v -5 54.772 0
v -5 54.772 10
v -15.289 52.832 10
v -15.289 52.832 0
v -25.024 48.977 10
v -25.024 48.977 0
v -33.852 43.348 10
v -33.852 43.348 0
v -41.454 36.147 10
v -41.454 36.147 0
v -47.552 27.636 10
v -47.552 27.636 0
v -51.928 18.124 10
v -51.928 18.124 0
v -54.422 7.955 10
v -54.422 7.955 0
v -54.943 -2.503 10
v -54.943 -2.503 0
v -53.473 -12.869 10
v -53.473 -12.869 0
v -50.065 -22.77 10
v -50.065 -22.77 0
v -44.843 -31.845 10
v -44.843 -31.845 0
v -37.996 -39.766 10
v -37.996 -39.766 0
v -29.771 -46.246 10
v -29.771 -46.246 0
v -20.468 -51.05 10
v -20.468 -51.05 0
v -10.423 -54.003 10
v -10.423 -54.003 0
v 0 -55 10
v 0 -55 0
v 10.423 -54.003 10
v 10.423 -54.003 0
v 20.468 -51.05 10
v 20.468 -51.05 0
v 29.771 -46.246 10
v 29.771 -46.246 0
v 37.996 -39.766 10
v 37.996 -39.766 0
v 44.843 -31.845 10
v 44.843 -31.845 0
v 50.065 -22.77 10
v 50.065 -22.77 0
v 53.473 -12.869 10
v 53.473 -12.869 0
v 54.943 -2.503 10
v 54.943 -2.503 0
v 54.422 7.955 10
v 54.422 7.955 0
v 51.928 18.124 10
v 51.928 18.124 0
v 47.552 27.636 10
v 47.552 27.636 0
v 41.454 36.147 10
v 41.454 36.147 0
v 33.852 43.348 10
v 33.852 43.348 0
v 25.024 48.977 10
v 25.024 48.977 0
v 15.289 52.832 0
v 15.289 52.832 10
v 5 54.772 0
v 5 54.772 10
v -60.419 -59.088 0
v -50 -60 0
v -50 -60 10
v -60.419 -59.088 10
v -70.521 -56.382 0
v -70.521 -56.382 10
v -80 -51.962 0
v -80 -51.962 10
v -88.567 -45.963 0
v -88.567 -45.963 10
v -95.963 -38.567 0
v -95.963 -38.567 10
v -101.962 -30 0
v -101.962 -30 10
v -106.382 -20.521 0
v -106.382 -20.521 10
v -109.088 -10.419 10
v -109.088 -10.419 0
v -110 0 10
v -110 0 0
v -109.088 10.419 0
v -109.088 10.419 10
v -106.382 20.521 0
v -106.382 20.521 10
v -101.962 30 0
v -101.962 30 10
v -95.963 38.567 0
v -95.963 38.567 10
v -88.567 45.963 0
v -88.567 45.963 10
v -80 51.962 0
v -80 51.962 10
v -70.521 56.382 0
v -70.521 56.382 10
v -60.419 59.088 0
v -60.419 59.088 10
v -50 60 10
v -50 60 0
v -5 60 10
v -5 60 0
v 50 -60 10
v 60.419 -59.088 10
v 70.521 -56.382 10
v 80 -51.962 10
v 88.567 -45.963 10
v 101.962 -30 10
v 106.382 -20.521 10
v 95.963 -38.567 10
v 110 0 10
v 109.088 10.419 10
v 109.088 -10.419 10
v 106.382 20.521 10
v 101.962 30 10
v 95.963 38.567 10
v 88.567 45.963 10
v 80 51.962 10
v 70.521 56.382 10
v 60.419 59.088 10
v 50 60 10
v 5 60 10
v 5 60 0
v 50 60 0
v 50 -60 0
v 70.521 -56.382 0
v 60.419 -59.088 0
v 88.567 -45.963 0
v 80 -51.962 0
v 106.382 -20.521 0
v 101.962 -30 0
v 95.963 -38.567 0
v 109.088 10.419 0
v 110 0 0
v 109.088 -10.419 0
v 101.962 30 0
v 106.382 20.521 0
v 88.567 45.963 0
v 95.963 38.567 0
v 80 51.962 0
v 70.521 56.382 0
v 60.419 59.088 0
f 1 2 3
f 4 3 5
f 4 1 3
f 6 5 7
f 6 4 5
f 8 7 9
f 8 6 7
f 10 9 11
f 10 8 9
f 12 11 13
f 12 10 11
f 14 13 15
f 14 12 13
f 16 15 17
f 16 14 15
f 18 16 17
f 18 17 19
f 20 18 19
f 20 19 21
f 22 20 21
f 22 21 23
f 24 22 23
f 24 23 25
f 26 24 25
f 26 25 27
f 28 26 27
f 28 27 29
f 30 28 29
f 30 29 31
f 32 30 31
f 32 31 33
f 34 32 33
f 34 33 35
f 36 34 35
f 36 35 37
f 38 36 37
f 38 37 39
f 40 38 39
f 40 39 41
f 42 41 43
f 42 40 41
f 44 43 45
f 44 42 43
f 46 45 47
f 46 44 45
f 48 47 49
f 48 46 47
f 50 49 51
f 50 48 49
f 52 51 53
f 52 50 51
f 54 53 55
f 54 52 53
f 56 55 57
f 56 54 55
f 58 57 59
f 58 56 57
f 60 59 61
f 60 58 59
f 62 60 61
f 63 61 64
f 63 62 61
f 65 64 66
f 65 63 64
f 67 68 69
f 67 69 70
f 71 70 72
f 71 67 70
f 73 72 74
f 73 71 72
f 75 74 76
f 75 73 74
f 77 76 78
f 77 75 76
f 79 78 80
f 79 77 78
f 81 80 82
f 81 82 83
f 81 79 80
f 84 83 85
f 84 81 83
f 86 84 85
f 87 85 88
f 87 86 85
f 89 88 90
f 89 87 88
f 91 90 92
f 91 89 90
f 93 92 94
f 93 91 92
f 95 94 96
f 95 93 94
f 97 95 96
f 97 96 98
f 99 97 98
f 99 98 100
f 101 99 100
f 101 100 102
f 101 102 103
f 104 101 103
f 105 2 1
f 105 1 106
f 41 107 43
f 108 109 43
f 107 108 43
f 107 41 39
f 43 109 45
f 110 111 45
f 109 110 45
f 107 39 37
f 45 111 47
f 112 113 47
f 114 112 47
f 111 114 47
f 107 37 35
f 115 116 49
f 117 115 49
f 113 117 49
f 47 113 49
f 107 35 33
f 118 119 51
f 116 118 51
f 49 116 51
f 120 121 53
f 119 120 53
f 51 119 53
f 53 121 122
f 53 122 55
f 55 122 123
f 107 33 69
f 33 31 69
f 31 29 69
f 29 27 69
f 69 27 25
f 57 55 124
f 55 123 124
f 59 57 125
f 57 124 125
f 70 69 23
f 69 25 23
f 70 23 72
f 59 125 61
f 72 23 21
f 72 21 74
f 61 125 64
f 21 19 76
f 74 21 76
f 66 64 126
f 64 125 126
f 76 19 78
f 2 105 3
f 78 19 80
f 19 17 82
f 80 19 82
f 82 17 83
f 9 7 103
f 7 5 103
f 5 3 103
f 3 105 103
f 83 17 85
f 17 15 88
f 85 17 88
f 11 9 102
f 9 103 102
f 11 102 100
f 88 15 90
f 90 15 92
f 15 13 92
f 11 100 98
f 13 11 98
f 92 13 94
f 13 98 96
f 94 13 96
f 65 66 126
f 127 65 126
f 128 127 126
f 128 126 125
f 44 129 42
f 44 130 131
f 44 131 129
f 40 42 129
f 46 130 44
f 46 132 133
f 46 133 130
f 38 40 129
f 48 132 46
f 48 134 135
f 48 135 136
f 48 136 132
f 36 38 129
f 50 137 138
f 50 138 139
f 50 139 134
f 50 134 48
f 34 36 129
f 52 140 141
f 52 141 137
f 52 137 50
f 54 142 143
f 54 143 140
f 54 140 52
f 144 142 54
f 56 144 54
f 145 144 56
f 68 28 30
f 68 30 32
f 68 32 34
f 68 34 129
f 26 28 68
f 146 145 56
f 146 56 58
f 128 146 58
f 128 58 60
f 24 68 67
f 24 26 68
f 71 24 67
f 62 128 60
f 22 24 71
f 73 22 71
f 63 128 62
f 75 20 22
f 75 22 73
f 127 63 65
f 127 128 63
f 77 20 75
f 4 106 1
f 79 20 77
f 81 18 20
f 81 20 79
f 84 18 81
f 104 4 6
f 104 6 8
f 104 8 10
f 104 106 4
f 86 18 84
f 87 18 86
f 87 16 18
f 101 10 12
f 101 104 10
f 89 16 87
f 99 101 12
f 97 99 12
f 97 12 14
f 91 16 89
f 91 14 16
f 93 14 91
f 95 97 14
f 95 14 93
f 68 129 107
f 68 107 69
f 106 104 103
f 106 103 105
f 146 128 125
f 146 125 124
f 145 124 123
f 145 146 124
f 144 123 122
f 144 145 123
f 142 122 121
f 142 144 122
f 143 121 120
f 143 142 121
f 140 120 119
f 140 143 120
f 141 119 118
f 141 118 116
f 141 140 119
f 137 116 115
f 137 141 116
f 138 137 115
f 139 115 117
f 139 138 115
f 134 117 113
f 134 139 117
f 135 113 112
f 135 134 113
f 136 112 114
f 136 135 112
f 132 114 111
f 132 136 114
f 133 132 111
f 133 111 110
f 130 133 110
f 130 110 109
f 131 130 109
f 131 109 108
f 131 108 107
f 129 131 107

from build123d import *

# Parameters (mm, degrees)
SKETCH2_R           = 55
BOSS_EXTRUDE1_DEPTH = 10
CUT_EXTRUDE1_REACH  = 127.698
SKETCH4_W           = 10
SKETCH4_H           = 5.227744249


with BuildPart() as part:
    # Sketch2 → Boss-Extrude1 (new body)
    with BuildSketch(Plane.XY):
        with BuildLine():
            Line((-50, 60), (50, 60))
            ThreePointArc((50, 60), (110, 0), (50, -60))
            Line((50, -60), (-50, -60))
            ThreePointArc((-50, -60), (-110, 0), (-50, 60))
        make_face()
        Circle(SKETCH2_R, mode=Mode.SUBTRACT)
    extrude(amount=BOSS_EXTRUDE1_DEPTH)

    # Sketch4 → Cut-Extrude1 (cut, up to next)
    with BuildSketch(Plane.XY.offset(10), mode=Mode.PRIVATE) as cut_extrude1_sk1:
        with Locations((0, 57.386127876)):
            Rectangle(SKETCH4_W, SKETCH4_H)
    cut_extrude1_tool1 = extrude(cut_extrude1_sk1.sketch, amount=-CUT_EXTRUDE1_REACH, mode=Mode.PRIVATE) & part.part
    add(cut_extrude1_tool1.solids().sort_by_distance((0, 57.386128, 10))[0], mode=Mode.SUBTRACT)


solid = part.part
